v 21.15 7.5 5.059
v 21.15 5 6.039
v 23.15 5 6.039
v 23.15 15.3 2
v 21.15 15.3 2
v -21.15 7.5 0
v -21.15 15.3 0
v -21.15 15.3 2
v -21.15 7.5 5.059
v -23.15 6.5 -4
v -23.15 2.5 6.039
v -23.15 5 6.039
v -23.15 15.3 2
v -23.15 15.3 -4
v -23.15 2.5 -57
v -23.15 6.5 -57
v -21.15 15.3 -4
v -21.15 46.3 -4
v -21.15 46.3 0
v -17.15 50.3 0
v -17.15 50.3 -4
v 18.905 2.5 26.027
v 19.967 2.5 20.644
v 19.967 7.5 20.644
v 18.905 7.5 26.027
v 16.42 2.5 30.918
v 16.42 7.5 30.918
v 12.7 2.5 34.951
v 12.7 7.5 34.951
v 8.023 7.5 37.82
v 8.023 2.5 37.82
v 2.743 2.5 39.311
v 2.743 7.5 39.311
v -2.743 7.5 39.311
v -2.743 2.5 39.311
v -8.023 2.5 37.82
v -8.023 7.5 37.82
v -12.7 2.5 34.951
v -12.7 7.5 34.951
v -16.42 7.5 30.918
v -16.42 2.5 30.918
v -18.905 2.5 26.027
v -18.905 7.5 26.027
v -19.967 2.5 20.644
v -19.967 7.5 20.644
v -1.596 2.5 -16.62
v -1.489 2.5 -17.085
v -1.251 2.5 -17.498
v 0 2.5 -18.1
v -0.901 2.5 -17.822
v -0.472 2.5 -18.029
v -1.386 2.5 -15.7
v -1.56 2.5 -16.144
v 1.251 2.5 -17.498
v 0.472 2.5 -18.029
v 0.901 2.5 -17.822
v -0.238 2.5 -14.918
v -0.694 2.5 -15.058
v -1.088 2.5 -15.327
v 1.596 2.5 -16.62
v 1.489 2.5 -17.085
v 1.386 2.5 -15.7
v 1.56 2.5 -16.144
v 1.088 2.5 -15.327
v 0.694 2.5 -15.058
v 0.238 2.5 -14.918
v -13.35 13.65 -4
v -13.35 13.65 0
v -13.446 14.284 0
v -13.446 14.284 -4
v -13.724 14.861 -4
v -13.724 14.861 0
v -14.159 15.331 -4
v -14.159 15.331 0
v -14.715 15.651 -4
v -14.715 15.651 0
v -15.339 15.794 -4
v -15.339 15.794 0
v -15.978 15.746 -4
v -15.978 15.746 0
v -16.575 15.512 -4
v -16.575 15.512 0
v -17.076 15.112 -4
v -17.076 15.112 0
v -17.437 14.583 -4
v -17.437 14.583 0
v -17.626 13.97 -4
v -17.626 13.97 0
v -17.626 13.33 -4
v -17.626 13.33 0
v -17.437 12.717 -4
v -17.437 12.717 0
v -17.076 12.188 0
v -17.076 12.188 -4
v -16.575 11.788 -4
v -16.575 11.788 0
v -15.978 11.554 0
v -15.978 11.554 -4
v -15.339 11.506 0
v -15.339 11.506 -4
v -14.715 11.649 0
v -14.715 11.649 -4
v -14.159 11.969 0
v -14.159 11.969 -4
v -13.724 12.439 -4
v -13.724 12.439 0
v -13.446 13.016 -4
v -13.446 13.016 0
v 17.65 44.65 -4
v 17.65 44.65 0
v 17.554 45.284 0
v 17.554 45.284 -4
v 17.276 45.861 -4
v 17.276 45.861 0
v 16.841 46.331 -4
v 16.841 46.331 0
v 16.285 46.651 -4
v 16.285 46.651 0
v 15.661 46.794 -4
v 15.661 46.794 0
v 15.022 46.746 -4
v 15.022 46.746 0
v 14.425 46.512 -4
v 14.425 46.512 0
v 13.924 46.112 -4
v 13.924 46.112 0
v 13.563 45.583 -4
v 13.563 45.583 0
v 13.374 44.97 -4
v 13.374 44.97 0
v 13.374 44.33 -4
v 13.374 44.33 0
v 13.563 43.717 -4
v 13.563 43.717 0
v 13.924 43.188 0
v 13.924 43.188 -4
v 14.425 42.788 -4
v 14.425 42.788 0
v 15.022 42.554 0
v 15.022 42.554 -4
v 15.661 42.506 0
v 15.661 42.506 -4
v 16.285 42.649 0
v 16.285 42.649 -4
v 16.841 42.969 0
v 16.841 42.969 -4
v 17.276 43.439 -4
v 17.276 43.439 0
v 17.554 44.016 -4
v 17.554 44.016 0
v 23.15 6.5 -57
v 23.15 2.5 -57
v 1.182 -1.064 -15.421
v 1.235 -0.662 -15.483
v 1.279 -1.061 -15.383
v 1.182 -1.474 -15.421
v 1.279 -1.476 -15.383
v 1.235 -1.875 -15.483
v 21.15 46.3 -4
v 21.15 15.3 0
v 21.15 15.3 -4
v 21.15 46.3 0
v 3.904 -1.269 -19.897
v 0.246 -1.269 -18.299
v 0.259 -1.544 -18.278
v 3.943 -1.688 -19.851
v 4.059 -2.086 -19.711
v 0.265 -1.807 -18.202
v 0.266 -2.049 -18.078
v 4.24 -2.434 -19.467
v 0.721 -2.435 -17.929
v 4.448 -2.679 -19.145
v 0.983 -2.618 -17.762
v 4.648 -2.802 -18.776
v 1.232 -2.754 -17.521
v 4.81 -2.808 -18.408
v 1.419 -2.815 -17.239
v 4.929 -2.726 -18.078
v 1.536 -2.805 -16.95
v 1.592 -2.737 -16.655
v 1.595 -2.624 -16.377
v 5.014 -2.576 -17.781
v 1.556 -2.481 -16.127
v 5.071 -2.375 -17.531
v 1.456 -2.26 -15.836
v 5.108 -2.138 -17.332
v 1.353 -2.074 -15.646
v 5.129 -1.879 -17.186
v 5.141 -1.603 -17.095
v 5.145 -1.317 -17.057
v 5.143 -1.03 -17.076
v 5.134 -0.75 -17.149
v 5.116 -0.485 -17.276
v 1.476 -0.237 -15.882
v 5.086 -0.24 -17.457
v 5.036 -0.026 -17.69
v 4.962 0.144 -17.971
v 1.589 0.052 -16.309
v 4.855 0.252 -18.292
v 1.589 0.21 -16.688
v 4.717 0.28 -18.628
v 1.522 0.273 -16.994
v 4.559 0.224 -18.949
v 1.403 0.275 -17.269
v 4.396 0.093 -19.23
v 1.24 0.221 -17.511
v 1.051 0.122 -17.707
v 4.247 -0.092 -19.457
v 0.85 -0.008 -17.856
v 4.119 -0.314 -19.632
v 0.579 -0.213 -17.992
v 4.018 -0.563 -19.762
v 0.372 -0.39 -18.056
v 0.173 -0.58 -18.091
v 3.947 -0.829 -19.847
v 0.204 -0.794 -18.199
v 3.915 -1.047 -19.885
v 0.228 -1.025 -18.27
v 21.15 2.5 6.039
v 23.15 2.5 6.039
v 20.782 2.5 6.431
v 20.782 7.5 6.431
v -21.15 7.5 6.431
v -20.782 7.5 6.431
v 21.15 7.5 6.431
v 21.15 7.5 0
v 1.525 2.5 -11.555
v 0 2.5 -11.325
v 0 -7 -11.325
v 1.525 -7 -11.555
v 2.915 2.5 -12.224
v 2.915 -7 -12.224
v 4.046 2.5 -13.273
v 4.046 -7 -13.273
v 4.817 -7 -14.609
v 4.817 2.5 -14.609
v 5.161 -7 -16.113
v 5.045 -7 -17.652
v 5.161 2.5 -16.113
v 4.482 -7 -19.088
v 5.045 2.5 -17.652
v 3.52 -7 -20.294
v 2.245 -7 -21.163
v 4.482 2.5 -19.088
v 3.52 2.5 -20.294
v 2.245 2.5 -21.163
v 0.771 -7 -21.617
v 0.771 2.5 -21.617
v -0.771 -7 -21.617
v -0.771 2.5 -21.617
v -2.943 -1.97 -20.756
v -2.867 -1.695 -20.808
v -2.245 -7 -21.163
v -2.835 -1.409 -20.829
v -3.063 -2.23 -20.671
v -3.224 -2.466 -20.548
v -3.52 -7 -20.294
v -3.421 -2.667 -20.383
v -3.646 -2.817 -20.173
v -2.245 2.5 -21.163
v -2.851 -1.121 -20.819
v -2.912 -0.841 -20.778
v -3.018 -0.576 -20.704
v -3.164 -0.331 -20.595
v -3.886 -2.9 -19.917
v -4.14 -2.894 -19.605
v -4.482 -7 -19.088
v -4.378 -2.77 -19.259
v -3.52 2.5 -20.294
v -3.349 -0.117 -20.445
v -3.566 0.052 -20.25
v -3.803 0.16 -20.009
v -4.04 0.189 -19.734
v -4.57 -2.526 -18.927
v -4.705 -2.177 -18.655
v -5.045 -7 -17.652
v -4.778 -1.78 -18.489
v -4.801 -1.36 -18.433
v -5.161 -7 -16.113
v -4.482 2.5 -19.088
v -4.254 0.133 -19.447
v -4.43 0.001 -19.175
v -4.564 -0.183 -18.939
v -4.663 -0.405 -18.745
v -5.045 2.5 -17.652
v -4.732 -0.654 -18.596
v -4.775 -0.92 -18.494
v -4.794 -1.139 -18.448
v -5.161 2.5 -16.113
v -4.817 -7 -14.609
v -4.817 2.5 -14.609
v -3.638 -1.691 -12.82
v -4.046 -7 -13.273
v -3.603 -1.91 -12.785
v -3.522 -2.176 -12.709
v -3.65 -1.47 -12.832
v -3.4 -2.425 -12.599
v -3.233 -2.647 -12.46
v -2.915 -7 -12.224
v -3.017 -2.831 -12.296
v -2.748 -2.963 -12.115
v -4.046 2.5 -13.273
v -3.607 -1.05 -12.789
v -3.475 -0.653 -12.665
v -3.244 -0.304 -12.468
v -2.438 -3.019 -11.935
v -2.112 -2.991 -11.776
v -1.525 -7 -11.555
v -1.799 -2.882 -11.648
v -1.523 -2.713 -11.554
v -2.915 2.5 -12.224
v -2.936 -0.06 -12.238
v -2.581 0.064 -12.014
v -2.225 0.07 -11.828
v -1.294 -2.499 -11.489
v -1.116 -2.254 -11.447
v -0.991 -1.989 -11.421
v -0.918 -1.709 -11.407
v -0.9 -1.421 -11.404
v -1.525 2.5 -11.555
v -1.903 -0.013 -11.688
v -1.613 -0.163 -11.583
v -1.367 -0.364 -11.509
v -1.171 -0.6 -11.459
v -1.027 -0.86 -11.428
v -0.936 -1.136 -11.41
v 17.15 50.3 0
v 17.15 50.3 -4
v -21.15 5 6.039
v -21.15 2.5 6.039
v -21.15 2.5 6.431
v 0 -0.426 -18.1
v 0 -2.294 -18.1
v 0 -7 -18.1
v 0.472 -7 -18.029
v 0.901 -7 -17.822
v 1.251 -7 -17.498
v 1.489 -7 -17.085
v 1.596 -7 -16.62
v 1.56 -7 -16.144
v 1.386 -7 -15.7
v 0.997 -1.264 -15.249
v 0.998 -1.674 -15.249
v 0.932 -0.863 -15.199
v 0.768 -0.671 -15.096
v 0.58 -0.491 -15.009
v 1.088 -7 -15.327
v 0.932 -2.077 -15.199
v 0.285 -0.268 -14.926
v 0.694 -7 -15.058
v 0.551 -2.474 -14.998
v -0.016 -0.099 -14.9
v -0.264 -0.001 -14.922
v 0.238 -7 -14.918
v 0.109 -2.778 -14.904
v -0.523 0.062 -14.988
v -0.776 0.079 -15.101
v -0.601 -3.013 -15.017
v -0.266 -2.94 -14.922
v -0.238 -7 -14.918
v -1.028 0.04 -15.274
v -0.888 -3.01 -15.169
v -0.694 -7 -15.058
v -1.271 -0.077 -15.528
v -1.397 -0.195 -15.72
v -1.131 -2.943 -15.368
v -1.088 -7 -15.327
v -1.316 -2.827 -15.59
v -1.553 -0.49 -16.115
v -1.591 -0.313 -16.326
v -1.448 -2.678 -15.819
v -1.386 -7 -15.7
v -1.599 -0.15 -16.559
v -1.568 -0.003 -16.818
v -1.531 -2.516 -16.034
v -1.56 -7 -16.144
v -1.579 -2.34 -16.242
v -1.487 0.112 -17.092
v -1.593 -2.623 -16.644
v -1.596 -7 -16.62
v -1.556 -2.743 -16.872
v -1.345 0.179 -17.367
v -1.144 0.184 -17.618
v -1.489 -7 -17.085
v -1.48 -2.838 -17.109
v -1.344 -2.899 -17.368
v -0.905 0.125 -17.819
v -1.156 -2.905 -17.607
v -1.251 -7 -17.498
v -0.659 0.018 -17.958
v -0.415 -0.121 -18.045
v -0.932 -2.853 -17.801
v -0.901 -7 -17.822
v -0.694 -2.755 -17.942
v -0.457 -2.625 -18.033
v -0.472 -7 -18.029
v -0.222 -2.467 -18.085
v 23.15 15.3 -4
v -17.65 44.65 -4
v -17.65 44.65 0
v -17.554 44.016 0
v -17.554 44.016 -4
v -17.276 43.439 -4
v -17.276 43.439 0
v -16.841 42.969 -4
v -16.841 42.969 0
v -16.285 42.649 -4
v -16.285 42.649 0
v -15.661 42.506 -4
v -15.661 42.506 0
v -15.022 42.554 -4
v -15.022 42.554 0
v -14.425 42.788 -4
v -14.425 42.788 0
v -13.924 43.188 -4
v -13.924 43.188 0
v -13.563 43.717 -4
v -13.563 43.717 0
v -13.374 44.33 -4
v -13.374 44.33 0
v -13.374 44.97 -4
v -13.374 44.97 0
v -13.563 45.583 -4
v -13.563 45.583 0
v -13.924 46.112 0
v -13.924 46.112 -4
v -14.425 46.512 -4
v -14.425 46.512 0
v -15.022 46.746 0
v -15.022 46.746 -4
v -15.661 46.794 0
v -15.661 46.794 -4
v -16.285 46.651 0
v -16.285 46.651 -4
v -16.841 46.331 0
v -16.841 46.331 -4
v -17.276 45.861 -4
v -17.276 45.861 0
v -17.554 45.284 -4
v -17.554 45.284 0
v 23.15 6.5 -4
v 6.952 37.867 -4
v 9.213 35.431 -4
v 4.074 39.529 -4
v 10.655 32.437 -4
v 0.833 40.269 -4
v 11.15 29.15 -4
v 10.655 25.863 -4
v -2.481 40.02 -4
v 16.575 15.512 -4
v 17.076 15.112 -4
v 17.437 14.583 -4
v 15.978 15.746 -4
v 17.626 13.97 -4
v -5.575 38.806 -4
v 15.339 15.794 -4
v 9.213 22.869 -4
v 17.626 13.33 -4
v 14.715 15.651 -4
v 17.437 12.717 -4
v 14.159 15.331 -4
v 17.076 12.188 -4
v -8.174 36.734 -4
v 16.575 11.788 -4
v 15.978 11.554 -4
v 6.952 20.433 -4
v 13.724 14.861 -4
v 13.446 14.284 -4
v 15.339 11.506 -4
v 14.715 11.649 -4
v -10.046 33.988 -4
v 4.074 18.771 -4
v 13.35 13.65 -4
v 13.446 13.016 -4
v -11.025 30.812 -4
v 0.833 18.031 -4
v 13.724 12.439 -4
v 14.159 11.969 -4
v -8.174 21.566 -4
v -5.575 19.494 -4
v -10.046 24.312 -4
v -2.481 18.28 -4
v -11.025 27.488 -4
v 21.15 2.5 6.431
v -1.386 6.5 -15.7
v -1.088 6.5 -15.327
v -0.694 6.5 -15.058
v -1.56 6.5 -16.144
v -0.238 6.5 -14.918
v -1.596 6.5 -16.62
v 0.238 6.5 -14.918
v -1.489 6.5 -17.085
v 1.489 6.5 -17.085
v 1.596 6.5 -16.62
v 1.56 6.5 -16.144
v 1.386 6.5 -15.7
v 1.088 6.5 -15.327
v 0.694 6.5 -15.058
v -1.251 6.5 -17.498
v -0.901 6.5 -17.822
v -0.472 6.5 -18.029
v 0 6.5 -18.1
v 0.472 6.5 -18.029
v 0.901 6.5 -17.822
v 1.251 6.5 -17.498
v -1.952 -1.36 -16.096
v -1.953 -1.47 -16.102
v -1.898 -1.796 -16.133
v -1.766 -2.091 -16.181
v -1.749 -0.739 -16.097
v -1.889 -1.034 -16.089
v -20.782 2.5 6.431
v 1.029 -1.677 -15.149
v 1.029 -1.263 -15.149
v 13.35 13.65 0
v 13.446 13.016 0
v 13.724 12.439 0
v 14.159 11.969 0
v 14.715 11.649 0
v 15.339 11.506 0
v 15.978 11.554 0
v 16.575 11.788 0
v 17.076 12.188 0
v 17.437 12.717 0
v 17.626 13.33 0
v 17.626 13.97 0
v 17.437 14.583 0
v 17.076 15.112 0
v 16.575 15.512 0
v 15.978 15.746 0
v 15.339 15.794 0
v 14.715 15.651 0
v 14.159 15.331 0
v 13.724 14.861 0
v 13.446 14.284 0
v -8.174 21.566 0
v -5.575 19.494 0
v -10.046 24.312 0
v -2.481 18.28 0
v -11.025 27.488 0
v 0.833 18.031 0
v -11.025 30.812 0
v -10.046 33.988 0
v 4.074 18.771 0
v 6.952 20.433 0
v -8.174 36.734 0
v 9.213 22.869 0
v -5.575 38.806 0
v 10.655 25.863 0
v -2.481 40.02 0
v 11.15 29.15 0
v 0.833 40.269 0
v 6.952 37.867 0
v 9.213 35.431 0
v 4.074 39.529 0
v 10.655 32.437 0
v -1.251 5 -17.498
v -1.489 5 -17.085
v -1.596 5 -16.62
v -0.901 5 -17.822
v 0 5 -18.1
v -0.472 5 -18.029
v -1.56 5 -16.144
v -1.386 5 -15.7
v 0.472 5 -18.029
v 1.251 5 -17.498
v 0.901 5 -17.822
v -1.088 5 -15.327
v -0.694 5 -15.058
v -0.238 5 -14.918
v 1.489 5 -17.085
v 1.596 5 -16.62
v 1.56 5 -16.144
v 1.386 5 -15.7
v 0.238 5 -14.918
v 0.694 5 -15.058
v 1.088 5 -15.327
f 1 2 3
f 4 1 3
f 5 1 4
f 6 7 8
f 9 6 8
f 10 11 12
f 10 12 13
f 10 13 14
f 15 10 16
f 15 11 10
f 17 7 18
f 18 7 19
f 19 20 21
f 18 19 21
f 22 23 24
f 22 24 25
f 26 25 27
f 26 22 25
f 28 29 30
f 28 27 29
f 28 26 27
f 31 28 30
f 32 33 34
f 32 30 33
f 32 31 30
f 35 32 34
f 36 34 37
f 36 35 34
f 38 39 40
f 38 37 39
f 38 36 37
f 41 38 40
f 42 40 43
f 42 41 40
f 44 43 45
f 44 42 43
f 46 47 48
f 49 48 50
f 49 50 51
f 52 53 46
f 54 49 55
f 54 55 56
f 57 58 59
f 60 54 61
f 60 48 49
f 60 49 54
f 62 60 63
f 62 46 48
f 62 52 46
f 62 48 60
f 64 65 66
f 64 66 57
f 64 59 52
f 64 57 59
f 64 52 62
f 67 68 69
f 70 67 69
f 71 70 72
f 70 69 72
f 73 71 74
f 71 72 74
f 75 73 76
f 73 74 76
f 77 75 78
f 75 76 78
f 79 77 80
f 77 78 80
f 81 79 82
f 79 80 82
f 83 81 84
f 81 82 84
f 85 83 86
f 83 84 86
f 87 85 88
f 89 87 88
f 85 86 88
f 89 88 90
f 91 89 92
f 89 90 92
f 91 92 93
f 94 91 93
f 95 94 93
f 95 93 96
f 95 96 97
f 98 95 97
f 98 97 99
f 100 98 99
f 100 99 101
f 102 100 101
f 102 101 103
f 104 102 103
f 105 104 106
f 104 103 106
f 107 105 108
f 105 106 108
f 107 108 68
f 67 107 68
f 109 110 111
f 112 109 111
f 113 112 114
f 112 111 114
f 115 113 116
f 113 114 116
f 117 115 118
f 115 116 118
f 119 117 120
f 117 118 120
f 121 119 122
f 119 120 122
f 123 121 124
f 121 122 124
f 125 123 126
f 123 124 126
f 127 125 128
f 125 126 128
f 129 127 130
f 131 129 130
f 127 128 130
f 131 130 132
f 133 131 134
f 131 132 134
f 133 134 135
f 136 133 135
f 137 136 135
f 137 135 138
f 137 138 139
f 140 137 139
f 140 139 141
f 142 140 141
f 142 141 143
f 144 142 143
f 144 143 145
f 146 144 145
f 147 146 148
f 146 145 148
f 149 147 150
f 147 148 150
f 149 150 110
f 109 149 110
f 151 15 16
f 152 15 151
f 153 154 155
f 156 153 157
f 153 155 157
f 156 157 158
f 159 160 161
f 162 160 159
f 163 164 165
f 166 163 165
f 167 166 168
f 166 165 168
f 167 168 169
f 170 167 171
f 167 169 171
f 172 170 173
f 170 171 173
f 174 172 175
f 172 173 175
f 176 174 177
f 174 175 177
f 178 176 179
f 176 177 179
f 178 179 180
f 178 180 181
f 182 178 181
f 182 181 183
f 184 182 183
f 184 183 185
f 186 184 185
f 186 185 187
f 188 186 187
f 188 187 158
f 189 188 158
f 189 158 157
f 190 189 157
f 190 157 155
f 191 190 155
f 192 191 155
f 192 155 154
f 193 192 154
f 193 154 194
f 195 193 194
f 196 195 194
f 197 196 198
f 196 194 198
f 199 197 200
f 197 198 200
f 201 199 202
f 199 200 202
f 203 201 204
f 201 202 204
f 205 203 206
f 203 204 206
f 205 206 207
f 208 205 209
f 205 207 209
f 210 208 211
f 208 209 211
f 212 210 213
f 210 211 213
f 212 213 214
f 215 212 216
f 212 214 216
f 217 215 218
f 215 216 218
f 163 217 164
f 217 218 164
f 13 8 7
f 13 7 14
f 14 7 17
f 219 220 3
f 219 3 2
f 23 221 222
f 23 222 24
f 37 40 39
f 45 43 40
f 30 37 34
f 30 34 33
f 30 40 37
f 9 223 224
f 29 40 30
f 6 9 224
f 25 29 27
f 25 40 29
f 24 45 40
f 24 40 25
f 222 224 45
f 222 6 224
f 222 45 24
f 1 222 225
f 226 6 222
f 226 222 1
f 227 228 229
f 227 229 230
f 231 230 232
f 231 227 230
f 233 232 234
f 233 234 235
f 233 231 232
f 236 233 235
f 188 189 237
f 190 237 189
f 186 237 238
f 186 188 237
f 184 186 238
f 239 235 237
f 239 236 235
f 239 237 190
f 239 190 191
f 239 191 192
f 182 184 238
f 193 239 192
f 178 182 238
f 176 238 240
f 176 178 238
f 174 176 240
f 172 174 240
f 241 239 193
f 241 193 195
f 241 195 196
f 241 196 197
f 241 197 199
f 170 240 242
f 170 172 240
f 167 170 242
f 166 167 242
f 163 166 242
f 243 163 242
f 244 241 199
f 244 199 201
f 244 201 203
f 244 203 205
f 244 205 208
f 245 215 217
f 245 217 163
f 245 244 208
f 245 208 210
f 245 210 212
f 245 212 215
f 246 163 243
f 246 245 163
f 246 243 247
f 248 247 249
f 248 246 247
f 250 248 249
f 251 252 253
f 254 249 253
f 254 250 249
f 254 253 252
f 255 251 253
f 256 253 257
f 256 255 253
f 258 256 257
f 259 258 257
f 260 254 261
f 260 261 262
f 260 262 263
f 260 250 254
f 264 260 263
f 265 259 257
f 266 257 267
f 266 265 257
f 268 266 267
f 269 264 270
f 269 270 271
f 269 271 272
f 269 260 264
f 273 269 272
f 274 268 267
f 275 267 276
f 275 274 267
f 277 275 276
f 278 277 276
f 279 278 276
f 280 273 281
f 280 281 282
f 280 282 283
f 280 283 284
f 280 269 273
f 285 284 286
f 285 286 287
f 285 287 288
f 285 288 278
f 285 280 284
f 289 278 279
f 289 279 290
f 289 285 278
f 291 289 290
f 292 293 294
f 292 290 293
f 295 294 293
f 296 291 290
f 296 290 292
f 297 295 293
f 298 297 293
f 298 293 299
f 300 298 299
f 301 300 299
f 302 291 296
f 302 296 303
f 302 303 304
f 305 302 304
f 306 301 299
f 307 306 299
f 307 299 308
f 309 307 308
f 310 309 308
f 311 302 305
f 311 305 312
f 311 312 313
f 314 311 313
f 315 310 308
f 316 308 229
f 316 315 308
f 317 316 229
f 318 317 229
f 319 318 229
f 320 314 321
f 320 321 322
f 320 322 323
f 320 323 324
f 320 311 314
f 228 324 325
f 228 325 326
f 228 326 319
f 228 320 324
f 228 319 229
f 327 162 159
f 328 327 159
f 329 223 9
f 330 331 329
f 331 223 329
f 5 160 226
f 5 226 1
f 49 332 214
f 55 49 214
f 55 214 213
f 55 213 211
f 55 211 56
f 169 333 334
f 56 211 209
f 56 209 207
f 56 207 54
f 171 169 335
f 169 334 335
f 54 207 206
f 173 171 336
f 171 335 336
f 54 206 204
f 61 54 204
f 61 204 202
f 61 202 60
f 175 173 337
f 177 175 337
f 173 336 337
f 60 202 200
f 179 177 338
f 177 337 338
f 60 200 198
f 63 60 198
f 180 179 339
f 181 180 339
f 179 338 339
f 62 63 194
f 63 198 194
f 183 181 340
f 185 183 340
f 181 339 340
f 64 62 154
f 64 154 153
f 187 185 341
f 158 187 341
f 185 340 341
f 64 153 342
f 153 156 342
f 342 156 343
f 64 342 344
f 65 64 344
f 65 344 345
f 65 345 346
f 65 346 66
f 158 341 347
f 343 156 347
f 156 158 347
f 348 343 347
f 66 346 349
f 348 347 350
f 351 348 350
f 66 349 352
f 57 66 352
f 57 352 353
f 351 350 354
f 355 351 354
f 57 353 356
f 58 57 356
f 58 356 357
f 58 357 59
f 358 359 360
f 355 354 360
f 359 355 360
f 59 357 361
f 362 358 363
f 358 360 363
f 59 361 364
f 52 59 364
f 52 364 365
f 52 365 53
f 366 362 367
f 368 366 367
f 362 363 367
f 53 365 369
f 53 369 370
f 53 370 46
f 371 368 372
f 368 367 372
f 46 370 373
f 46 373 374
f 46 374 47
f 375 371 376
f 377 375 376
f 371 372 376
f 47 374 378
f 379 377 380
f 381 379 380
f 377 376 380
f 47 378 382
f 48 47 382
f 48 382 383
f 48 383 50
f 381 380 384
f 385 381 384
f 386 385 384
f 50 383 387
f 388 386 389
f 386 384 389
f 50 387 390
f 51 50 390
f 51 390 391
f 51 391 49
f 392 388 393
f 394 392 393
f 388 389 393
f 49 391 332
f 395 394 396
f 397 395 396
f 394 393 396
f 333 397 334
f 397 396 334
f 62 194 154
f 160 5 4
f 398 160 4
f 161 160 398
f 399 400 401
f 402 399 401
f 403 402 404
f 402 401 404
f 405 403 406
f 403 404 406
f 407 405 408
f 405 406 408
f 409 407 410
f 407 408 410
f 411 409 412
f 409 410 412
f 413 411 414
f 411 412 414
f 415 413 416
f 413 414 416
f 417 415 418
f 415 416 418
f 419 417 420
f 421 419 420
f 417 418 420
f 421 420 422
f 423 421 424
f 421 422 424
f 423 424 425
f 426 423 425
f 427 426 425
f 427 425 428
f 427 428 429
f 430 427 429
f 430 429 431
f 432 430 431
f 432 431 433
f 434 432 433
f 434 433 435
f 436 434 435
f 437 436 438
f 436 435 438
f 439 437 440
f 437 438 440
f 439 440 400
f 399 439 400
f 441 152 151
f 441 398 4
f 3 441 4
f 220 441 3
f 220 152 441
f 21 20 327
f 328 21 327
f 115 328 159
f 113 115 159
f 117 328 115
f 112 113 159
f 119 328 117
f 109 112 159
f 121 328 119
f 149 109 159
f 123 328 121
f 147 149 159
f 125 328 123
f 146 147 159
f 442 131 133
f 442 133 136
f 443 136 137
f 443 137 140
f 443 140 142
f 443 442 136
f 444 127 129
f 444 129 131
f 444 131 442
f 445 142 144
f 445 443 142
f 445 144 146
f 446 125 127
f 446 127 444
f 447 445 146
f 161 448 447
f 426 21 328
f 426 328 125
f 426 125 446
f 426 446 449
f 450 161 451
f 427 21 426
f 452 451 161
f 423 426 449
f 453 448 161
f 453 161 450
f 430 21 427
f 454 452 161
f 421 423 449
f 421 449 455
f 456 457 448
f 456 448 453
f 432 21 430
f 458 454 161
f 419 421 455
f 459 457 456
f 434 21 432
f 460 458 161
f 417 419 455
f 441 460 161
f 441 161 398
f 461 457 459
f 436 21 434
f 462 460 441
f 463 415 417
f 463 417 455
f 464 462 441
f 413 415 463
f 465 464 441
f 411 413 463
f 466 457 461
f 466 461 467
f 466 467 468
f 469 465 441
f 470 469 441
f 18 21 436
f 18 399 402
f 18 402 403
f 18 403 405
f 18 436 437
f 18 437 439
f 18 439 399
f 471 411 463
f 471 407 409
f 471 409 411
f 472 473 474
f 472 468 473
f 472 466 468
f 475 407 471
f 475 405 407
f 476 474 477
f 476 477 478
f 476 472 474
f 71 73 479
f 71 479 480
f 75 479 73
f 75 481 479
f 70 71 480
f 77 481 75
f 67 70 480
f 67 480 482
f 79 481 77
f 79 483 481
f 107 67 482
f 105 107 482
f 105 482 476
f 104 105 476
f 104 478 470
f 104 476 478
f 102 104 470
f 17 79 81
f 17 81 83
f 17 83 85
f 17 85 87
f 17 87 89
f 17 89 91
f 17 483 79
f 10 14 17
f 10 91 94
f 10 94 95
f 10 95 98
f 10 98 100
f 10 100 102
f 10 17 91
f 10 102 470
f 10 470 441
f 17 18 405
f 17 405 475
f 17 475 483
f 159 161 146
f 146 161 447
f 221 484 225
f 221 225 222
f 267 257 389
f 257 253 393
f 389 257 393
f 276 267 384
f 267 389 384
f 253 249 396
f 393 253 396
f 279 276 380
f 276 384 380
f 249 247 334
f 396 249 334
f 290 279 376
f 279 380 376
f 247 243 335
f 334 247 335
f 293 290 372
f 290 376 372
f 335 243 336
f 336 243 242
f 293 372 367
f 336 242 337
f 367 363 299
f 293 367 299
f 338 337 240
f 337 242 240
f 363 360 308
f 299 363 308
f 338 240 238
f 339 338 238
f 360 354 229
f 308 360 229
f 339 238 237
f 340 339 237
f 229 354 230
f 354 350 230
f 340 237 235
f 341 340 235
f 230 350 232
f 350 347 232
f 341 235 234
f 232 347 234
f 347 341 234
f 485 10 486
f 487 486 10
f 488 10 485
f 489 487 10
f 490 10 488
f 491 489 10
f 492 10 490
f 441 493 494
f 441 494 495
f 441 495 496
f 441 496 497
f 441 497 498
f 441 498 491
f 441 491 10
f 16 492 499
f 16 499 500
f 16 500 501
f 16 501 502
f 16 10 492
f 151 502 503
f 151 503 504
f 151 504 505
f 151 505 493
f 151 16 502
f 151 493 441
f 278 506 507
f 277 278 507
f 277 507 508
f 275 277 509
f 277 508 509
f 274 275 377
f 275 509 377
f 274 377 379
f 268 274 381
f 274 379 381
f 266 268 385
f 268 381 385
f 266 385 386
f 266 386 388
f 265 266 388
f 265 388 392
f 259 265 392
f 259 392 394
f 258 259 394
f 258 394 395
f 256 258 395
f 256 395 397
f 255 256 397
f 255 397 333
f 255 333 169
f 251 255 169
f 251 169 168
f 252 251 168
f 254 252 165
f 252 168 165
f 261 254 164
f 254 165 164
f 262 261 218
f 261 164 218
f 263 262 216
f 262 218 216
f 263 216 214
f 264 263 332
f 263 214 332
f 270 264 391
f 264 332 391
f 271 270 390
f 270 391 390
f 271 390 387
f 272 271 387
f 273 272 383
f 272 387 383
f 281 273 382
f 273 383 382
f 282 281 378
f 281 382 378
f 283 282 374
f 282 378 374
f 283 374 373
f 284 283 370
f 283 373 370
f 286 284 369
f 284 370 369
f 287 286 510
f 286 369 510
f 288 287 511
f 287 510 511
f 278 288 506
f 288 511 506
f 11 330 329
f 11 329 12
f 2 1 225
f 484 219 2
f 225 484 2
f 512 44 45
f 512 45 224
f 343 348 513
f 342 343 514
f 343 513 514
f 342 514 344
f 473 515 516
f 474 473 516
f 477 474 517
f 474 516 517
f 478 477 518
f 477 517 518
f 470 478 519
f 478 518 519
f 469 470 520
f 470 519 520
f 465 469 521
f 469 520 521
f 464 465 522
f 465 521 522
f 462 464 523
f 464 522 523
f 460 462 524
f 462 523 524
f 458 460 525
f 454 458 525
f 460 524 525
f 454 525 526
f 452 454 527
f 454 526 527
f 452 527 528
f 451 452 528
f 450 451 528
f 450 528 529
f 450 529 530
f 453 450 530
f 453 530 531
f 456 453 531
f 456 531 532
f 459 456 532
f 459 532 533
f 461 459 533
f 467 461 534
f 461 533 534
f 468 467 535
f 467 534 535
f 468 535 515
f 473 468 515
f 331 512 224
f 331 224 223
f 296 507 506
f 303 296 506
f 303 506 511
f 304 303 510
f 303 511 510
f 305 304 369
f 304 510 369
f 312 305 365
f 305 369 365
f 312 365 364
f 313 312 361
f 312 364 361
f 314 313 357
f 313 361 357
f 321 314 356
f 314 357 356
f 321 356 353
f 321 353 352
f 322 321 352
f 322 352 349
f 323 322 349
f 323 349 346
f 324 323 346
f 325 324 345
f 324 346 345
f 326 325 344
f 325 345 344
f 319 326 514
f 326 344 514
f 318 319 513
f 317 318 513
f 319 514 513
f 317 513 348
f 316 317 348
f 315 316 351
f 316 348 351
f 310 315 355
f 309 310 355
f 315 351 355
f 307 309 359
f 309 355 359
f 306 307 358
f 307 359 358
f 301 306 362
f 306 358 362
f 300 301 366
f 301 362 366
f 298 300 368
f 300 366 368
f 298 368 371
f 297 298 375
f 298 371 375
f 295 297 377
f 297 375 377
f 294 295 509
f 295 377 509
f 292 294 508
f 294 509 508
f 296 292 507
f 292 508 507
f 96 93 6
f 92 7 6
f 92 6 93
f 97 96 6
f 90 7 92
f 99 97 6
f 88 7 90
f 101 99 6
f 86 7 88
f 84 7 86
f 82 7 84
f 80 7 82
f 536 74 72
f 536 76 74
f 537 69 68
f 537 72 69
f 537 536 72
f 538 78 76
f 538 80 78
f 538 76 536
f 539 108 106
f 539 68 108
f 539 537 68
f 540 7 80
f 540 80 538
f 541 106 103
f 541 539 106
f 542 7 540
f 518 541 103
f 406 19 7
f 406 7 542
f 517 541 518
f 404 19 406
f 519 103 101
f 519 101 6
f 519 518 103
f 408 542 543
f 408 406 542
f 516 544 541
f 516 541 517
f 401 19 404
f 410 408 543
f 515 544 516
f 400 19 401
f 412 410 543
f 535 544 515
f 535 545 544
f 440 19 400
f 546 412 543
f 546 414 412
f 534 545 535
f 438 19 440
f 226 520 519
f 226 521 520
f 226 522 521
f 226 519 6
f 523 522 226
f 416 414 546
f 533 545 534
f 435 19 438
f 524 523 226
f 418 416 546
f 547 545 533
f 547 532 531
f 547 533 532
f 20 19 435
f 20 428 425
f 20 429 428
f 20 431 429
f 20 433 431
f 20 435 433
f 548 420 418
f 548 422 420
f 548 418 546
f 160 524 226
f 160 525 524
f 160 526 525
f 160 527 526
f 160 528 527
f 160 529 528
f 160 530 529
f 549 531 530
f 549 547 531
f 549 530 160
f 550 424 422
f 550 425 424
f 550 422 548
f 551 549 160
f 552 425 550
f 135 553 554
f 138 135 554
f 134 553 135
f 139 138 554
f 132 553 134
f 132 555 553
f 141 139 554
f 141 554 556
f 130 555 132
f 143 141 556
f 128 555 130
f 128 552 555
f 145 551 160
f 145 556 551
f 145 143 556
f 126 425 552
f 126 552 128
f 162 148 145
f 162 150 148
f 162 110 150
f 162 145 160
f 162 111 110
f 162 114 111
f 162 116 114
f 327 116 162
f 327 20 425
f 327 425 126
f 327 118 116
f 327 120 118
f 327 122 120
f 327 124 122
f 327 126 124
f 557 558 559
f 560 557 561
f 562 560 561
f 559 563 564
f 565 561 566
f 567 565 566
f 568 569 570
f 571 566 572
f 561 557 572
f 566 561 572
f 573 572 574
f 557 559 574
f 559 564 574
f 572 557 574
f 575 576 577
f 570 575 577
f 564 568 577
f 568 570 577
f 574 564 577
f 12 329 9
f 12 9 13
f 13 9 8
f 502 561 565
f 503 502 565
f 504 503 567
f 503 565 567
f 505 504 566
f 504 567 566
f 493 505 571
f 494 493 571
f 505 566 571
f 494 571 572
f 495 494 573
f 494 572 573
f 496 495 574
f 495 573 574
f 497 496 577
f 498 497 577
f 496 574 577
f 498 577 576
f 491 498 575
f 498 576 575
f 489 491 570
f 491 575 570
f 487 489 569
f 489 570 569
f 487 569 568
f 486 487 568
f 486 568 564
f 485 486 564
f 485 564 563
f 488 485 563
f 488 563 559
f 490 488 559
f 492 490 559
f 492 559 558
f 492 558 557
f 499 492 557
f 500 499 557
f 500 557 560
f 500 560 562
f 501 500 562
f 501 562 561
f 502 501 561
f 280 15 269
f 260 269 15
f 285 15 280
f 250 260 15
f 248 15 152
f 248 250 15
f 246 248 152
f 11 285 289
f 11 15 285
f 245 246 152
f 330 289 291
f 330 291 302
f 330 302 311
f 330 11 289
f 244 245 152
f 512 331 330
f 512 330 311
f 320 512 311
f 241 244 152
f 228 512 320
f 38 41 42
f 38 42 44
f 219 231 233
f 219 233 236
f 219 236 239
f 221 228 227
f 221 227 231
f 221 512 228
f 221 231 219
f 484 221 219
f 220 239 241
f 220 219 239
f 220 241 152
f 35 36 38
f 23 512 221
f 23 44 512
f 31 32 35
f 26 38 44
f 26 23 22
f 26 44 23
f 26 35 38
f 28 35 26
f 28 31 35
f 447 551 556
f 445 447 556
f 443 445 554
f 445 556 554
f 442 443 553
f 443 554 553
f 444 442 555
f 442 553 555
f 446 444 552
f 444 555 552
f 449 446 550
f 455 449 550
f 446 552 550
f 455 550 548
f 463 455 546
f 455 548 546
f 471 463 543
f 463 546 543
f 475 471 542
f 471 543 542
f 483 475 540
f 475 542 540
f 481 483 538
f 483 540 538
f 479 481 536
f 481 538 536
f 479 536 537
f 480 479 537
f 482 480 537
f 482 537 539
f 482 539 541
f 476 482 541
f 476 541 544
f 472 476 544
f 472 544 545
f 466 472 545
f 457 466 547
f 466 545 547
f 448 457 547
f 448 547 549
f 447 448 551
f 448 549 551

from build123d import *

# Parameters (mm, degrees)
SKETCH_5_W                = 42.3
SKETCH_5_H                = 50.3
SKETCH_5_R                = 11.15
SKETCH_5_R_2              = 2.15
EXTRUDE_2_DEPTH           = 4
EXTRUDE_3_DEPTH           = 4
SKETCH_7_R                = 1.7
CUT_EXTRUDE_3_DEPTH       = 4
CHAMFER_1_SIZE            = 4
EXTRUDE_4_DEPTH           = 2
EXTRUDE_5_REACH           = 79.8
EXTRUDE_6_REACH           = 80.956
SKETCH_12_W               = 46.3
SKETCH_12_H               = 3
EXTRUDE_7_DEPTH           = 53
EXTRUDE_9_DEPTH           = 4
CUT_EXTRUDE_4_DEPTH       = 5
SKETCH_17_R               = 5.175
EXTRUDE_10_DEPTH          = 15
SKETCH_18_R               = 1.6
CUT_EXTRUDE_6_DEPTH       = 15
F_2_0MM_1_D               = 3.1
F_2_0MM_1_DEPTH           = 4.45
F_2_0MM_1_TIP             = 1.55
F_2_0MM_1_ON_FACE_2_D     = 3.1
F_2_0MM_1_ON_FACE_2_DEPTH = 4.45
F_2_0MM_1_ON_FACE_2_TIP   = 1.55
F_2_0MM_1_ON_FACE_3_D     = 3.1
F_2_0MM_1_ON_FACE_3_DEPTH = 4.45
F_2_0MM_1_ON_FACE_3_TIP   = 1.55
SKETCH_21_W               = 46.3
SKETCH_21_H               = 53
CUT_EXTRUDE_7_DEPTH       = 1.5
CUT_EXTRUDE_START         = -0.5
CUT_EXTRUDE_8_DEPTH       = 0.5
EXTRUDE_START             = 2.5
EXTRUDE_11_DEPTH          = 2.5


with BuildPart() as part:
    # Sketch 5 → Extrude 2 (new body)
    with BuildSketch(Plane.XY):
        with Locations((0, 25.15)):
            Rectangle(SKETCH_5_W, SKETCH_5_H)
        with Locations((0, 29.15)):
            Circle(SKETCH_5_R, mode=Mode.SUBTRACT)
        with Locations((15.5, 44.65)):
            Circle(SKETCH_5_R_2, mode=Mode.SUBTRACT)
        with Locations(Location((15.5, 13.65, 0), (0, 0, 180))):
            Circle(SKETCH_5_R_2, mode=Mode.SUBTRACT)
        with Locations((-15.5, 13.65)):
            Circle(SKETCH_5_R_2, mode=Mode.SUBTRACT)
        with Locations(Location((-15.5, 44.65, 0), (0, 0, 180))):
            Circle(SKETCH_5_R_2, mode=Mode.SUBTRACT)
    extrude(amount=-EXTRUDE_2_DEPTH)

    # Sketch 6 → Extrude 3 (add)
    with BuildSketch(Plane.XZ):
        with BuildLine():
            Line((-21.15, 0), (-19.967256346, 20.643972909))
            ThreePointArc((-19.967256346, 20.643972909), (0, 39.5), (19.967256346, 20.643972909))
            Line((19.967256346, 20.643972909), (21.15, 0))
            Line((21.15, 0), (-21.15, 0))
        make_face()
    extrude(amount=-EXTRUDE_3_DEPTH)

    # Sketch 7 → Cut-Extrude 3 (cut)
    with BuildSketch(Plane(origin=(0, 4, 0), x_dir=(1, 0, 0), z_dir=(0, 1, 0))):
        with Locations(Location((0, -5.5, 0), (0, 0, 270))):
            Circle(SKETCH_7_R)
        with Locations(Location((12.124355653, -12.5, 0), (0, 0, 270))):
            Circle(SKETCH_7_R)
        with Locations(Location((12.124355653, -26.5, 0), (0, 0, 270))):
            Circle(SKETCH_7_R)
        with Locations(Location((0, -33.5, 0), (0, 0, 270))):
            Circle(SKETCH_7_R)
        with Locations(Location((-12.124355653, -26.5, 0), (0, 0, 270))):
            Circle(SKETCH_7_R)
        with Locations(Location((-12.124355653, -12.5, 0), (0, 0, 270))):
            Circle(SKETCH_7_R)
    extrude(amount=-CUT_EXTRUDE_3_DEPTH, mode=Mode.SUBTRACT)

    # Chamfer 1
    chamfer_1_edges = [part.edges().sort_by_distance(p)[0] for p in [
        (-21.15, 50.3, -2),
        (21.15, 50.3, -2),
    ]]
    chamfer(chamfer_1_edges, length=CHAMFER_1_SIZE)

    # Sketch 9 → Extrude 4 (add)
    with BuildSketch(Plane.ZY.offset(21.15)):
        Polygon((-4, 0), (8, 0), (2, 15.3), (-4, 15.3), align=None)
    extrude_4 = extrude(amount=EXTRUDE_4_DEPTH)

    # Extrude 5: up to this face of the body (flat: up to its plane)
    extrude_5_end = Plane(part.part.faces().sort_by_distance((-20.558628173, 2, 10.321986454))[0])
    # Sketch 10 → Extrude 5 (add, up to the picked face)
    with BuildSketch(Plane.ZY.offset(23.15), mode=Mode.PRIVATE) as extrude_5_sk1:
        Polygon((-4, 0), (8, 0), (6.431372549, 4), (-4, 4), align=None)
    extrude_5_tool1 = split(extrude(extrude_5_sk1.sketch, amount=-EXTRUDE_5_REACH, mode=Mode.PRIVATE), bisect_by=extrude_5_end, keep=Keep.BOTH, mode=Mode.PRIVATE)
    add(extrude_5_tool1.solids().sort_by(Axis((-23.15, 1.95338, 1.616984), (1, 0, 0)))[0])

    # Mirror 2: Extrude 4 across plane
    add(extrude_4.mirror(Plane(origin=(0, 0, 0), x_dir=(0, 0, 1), z_dir=(1, 0, 0))))

    # Extrude 6: up to this face of the body (flat: up to its plane)
    extrude_6_end = Plane(part.part.faces().sort_by_distance((20.558628173, 2, 10.321986454))[0])
    # Sketch 11 → Extrude 6 (add, up to the picked face)
    with BuildSketch(Plane(origin=(23.15, 0, 0), x_dir=(0, 0, -1), z_dir=(1, 0, 0)), mode=Mode.PRIVATE) as extrude_6_sk1:
        Polygon((-6.431372549, 4), (4, 4), (4, 0), (-8, 0), align=None)
    extrude_6_tool1 = split(extrude(extrude_6_sk1.sketch, amount=-EXTRUDE_6_REACH, mode=Mode.PRIVATE), bisect_by=extrude_6_end, keep=Keep.BOTH, mode=Mode.PRIVATE)
    add(extrude_6_tool1.solids().sort_by(Axis((23.15, 1.95338, 1.616984), (-1, 0, 0)))[0])

    # Sketch 12 → Extrude 7 (add)
    with BuildSketch(Plane(origin=(0, 0, -4), x_dir=(-1, 0, 0), z_dir=(0, 0, -1))):
        with Locations((0, 6.5)):
            Rectangle(SKETCH_12_W, SKETCH_12_H)
    extrude(amount=EXTRUDE_7_DEPTH)

    # Sketch 14 → Extrude 9 (add)
    with BuildSketch(Plane(origin=(0, 4, 0), x_dir=(1, 0, 0), z_dir=(0, 1, 0))):
        with BuildLine():
            Line((21.15, 0), (-21.15, 0))
            Line((-21.15, 0), (-21.15, -6.431372549))
            Line((-21.15, -6.431372549), (-20.781530951, -6.431372549))
            Line((-20.781530951, -6.431372549), (-19.967256346, -20.643972909))
            ThreePointArc((-19.967256346, -20.643972909), (0, -39.5), (19.967256346, -20.643972909))
            Line((19.967256346, -20.643972909), (20.781530951, -6.431372549))
            Line((20.781530951, -6.431372549), (21.15, -6.431372549))
            Line((21.15, -6.431372549), (21.15, 0))
        make_face()
    extrude(amount=EXTRUDE_9_DEPTH)

    # Sketch 15 → Cut-Extrude 4 (cut)
    with BuildSketch(Plane.XZ):
        with BuildLine():
            Line((-23.15, -4), (23.15, -4))
            Line((23.15, -4), (23.15, 8))
            Line((23.15, 8), (20.691660451, 8))
            Line((20.691660451, 8), (19.967256346, 20.643972909))
            ThreePointArc((19.967256346, 20.643972909), (0, 39.5), (-19.967256346, 20.643972909))
            Line((-19.967256346, 20.643972909), (-20.691660451, 8))
            Line((-20.691660451, 8), (-23.15, 8))
            Line((-23.15, 8), (-23.15, -4))
        make_face()
    extrude(amount=-CUT_EXTRUDE_4_DEPTH, mode=Mode.SUBTRACT)

    # Sketch 17 → Extrude 10 (add)
    with BuildSketch(Plane(origin=(0, 8, 0), x_dir=(1, 0, 0), z_dir=(0, 1, 0))):
        with Locations(Location((0, 16.5, 0), (0, 0, 270))):
            Circle(SKETCH_17_R)
    extrude(amount=-EXTRUDE_10_DEPTH)

    # Sketch 18 → Cut-Extrude 6 (cut)
    with BuildSketch(Plane.XZ.offset(7)):
        with Locations(Location((0, -16.5, 0), (0, 0, 270))):
            Circle(SKETCH_18_R)
    extrude(amount=-CUT_EXTRUDE_6_DEPTH, mode=Mode.SUBTRACT)

    # 2.0mm _1
    with Locations(Plane(origin=(-2.383959963, -1.470142013, -11.906813753), x_dir=(0.887572221549, 0, 0.46066859187), z_dir=(-0.46066859187, 0, 0.887572221549))):
        with Locations((0, 0)):
            Hole(F_2_0MM_1_D / 2, depth=F_2_0MM_1_DEPTH)
            with Locations((0, 0, -(F_2_0MM_1_DEPTH + F_2_0MM_1_TIP / 2))):  # 90° drill point
                Cone(0, F_2_0MM_1_D / 2, F_2_0MM_1_TIP, mode=Mode.SUBTRACT)

    # 2.0mm _1 on face 2
    with Locations(Plane(origin=(-4.001379199, -1.359919587, -19.781705274), x_dir=(0.634146160856, 0, -0.773213196131), z_dir=(-0.773213196131, 0, -0.634146160856))):
        with Locations((-1e-09, 0)):
            Hole(F_2_0MM_1_ON_FACE_2_D / 2, depth=F_2_0MM_1_ON_FACE_2_DEPTH)
            with Locations((0, 0, -(F_2_0MM_1_ON_FACE_2_DEPTH + F_2_0MM_1_ON_FACE_2_TIP / 2))):  # 90° drill point
                Cone(0, F_2_0MM_1_ON_FACE_2_D / 2, F_2_0MM_1_ON_FACE_2_TIP, mode=Mode.SUBTRACT)

    # 2.0mm _1 on face 3
    with Locations(Plane(origin=(4.74207792, -1.268589172, -18.572033301), x_dir=(0.40039282367, 0, 0.916343596449), z_dir=(0.916343596449, 0, -0.40039282367))):
        with Locations((0, 0)):
            Hole(F_2_0MM_1_ON_FACE_3_D / 2, depth=F_2_0MM_1_ON_FACE_3_DEPTH)
            with Locations((0, 0, -(F_2_0MM_1_ON_FACE_3_DEPTH + F_2_0MM_1_ON_FACE_3_TIP / 2))):  # 90° drill point
                Cone(0, F_2_0MM_1_ON_FACE_3_D / 2, F_2_0MM_1_ON_FACE_3_TIP, mode=Mode.SUBTRACT)

    # Sketch 21 → Cut-Extrude 7 (cut)
    with BuildSketch(Plane(origin=(0, 8, 0), x_dir=(1, 0, 0), z_dir=(0, 1, 0))):
        with Locations((0, 30.5)):
            Rectangle(SKETCH_21_W, SKETCH_21_H)
    extrude(amount=-CUT_EXTRUDE_7_DEPTH, mode=Mode.SUBTRACT)

    # Sketch 22 → Cut-Extrude 8 (cut)
    with BuildSketch(Plane(origin=(0, 8, 0), x_dir=(1, 0, 0), z_dir=(0, 1, 0)).offset(CUT_EXTRUDE_START)):
        with BuildLine():
            Line((21.15, -6.431372549), (21.15, -4.862745098))
            Line((21.15, -4.862745098), (21.15, 0))
            Line((21.15, 0), (-21.15, 0))
            Line((-21.15, 0), (-21.15, -4.862745098))
            Line((-21.15, -4.862745098), (-21.15, -6.431372549))
            Line((-21.15, -6.431372549), (-20.781530951, -6.431372549))
            Line((-20.781530951, -6.431372549), (-19.967256346, -20.643972909))
            ThreePointArc((-19.967256346, -20.643972909), (0, -39.5), (19.967256346, -20.643972909))
            Line((19.967256346, -20.643972909), (20.781530951, -6.431372549))
            Line((20.781530951, -6.431372549), (21.15, -6.431372549))
        make_face()
    extrude(amount=CUT_EXTRUDE_8_DEPTH, mode=Mode.SUBTRACT)

    # Sketch 23 → Extrude 11 (add)
    with BuildSketch(Plane.XZ.offset(-5).offset(EXTRUDE_START)):
        with BuildLine():
            Line((23.15, -57), (23.15, 6.039215686))
            Line((23.15, 6.039215686), (21.15, 6.039215686))
            Line((21.15, 6.039215686), (21.15, 6.431372549))
            Line((21.15, 6.431372549), (20.781530951, 6.431372549))
            Line((20.781530951, 6.431372549), (19.967256346, 20.643972909))
            ThreePointArc((19.967256346, 20.643972909), (0, 39.5), (-19.967256346, 20.643972909))
            Line((-19.967256346, 20.643972909), (-20.781530951, 6.431372549))
            Line((-20.781530951, 6.431372549), (-21.15, 6.431372549))
            Line((-21.15, 6.431372549), (-21.15, 6.039215686))
            Line((-21.15, 6.039215686), (-23.15, 6.039215686))
            Line((-23.15, 6.039215686), (-23.15, -57))
            Line((-23.15, -57), (23.15, -57))
        make_face()
    extrude(amount=-EXTRUDE_11_DEPTH)


solid = part.part
